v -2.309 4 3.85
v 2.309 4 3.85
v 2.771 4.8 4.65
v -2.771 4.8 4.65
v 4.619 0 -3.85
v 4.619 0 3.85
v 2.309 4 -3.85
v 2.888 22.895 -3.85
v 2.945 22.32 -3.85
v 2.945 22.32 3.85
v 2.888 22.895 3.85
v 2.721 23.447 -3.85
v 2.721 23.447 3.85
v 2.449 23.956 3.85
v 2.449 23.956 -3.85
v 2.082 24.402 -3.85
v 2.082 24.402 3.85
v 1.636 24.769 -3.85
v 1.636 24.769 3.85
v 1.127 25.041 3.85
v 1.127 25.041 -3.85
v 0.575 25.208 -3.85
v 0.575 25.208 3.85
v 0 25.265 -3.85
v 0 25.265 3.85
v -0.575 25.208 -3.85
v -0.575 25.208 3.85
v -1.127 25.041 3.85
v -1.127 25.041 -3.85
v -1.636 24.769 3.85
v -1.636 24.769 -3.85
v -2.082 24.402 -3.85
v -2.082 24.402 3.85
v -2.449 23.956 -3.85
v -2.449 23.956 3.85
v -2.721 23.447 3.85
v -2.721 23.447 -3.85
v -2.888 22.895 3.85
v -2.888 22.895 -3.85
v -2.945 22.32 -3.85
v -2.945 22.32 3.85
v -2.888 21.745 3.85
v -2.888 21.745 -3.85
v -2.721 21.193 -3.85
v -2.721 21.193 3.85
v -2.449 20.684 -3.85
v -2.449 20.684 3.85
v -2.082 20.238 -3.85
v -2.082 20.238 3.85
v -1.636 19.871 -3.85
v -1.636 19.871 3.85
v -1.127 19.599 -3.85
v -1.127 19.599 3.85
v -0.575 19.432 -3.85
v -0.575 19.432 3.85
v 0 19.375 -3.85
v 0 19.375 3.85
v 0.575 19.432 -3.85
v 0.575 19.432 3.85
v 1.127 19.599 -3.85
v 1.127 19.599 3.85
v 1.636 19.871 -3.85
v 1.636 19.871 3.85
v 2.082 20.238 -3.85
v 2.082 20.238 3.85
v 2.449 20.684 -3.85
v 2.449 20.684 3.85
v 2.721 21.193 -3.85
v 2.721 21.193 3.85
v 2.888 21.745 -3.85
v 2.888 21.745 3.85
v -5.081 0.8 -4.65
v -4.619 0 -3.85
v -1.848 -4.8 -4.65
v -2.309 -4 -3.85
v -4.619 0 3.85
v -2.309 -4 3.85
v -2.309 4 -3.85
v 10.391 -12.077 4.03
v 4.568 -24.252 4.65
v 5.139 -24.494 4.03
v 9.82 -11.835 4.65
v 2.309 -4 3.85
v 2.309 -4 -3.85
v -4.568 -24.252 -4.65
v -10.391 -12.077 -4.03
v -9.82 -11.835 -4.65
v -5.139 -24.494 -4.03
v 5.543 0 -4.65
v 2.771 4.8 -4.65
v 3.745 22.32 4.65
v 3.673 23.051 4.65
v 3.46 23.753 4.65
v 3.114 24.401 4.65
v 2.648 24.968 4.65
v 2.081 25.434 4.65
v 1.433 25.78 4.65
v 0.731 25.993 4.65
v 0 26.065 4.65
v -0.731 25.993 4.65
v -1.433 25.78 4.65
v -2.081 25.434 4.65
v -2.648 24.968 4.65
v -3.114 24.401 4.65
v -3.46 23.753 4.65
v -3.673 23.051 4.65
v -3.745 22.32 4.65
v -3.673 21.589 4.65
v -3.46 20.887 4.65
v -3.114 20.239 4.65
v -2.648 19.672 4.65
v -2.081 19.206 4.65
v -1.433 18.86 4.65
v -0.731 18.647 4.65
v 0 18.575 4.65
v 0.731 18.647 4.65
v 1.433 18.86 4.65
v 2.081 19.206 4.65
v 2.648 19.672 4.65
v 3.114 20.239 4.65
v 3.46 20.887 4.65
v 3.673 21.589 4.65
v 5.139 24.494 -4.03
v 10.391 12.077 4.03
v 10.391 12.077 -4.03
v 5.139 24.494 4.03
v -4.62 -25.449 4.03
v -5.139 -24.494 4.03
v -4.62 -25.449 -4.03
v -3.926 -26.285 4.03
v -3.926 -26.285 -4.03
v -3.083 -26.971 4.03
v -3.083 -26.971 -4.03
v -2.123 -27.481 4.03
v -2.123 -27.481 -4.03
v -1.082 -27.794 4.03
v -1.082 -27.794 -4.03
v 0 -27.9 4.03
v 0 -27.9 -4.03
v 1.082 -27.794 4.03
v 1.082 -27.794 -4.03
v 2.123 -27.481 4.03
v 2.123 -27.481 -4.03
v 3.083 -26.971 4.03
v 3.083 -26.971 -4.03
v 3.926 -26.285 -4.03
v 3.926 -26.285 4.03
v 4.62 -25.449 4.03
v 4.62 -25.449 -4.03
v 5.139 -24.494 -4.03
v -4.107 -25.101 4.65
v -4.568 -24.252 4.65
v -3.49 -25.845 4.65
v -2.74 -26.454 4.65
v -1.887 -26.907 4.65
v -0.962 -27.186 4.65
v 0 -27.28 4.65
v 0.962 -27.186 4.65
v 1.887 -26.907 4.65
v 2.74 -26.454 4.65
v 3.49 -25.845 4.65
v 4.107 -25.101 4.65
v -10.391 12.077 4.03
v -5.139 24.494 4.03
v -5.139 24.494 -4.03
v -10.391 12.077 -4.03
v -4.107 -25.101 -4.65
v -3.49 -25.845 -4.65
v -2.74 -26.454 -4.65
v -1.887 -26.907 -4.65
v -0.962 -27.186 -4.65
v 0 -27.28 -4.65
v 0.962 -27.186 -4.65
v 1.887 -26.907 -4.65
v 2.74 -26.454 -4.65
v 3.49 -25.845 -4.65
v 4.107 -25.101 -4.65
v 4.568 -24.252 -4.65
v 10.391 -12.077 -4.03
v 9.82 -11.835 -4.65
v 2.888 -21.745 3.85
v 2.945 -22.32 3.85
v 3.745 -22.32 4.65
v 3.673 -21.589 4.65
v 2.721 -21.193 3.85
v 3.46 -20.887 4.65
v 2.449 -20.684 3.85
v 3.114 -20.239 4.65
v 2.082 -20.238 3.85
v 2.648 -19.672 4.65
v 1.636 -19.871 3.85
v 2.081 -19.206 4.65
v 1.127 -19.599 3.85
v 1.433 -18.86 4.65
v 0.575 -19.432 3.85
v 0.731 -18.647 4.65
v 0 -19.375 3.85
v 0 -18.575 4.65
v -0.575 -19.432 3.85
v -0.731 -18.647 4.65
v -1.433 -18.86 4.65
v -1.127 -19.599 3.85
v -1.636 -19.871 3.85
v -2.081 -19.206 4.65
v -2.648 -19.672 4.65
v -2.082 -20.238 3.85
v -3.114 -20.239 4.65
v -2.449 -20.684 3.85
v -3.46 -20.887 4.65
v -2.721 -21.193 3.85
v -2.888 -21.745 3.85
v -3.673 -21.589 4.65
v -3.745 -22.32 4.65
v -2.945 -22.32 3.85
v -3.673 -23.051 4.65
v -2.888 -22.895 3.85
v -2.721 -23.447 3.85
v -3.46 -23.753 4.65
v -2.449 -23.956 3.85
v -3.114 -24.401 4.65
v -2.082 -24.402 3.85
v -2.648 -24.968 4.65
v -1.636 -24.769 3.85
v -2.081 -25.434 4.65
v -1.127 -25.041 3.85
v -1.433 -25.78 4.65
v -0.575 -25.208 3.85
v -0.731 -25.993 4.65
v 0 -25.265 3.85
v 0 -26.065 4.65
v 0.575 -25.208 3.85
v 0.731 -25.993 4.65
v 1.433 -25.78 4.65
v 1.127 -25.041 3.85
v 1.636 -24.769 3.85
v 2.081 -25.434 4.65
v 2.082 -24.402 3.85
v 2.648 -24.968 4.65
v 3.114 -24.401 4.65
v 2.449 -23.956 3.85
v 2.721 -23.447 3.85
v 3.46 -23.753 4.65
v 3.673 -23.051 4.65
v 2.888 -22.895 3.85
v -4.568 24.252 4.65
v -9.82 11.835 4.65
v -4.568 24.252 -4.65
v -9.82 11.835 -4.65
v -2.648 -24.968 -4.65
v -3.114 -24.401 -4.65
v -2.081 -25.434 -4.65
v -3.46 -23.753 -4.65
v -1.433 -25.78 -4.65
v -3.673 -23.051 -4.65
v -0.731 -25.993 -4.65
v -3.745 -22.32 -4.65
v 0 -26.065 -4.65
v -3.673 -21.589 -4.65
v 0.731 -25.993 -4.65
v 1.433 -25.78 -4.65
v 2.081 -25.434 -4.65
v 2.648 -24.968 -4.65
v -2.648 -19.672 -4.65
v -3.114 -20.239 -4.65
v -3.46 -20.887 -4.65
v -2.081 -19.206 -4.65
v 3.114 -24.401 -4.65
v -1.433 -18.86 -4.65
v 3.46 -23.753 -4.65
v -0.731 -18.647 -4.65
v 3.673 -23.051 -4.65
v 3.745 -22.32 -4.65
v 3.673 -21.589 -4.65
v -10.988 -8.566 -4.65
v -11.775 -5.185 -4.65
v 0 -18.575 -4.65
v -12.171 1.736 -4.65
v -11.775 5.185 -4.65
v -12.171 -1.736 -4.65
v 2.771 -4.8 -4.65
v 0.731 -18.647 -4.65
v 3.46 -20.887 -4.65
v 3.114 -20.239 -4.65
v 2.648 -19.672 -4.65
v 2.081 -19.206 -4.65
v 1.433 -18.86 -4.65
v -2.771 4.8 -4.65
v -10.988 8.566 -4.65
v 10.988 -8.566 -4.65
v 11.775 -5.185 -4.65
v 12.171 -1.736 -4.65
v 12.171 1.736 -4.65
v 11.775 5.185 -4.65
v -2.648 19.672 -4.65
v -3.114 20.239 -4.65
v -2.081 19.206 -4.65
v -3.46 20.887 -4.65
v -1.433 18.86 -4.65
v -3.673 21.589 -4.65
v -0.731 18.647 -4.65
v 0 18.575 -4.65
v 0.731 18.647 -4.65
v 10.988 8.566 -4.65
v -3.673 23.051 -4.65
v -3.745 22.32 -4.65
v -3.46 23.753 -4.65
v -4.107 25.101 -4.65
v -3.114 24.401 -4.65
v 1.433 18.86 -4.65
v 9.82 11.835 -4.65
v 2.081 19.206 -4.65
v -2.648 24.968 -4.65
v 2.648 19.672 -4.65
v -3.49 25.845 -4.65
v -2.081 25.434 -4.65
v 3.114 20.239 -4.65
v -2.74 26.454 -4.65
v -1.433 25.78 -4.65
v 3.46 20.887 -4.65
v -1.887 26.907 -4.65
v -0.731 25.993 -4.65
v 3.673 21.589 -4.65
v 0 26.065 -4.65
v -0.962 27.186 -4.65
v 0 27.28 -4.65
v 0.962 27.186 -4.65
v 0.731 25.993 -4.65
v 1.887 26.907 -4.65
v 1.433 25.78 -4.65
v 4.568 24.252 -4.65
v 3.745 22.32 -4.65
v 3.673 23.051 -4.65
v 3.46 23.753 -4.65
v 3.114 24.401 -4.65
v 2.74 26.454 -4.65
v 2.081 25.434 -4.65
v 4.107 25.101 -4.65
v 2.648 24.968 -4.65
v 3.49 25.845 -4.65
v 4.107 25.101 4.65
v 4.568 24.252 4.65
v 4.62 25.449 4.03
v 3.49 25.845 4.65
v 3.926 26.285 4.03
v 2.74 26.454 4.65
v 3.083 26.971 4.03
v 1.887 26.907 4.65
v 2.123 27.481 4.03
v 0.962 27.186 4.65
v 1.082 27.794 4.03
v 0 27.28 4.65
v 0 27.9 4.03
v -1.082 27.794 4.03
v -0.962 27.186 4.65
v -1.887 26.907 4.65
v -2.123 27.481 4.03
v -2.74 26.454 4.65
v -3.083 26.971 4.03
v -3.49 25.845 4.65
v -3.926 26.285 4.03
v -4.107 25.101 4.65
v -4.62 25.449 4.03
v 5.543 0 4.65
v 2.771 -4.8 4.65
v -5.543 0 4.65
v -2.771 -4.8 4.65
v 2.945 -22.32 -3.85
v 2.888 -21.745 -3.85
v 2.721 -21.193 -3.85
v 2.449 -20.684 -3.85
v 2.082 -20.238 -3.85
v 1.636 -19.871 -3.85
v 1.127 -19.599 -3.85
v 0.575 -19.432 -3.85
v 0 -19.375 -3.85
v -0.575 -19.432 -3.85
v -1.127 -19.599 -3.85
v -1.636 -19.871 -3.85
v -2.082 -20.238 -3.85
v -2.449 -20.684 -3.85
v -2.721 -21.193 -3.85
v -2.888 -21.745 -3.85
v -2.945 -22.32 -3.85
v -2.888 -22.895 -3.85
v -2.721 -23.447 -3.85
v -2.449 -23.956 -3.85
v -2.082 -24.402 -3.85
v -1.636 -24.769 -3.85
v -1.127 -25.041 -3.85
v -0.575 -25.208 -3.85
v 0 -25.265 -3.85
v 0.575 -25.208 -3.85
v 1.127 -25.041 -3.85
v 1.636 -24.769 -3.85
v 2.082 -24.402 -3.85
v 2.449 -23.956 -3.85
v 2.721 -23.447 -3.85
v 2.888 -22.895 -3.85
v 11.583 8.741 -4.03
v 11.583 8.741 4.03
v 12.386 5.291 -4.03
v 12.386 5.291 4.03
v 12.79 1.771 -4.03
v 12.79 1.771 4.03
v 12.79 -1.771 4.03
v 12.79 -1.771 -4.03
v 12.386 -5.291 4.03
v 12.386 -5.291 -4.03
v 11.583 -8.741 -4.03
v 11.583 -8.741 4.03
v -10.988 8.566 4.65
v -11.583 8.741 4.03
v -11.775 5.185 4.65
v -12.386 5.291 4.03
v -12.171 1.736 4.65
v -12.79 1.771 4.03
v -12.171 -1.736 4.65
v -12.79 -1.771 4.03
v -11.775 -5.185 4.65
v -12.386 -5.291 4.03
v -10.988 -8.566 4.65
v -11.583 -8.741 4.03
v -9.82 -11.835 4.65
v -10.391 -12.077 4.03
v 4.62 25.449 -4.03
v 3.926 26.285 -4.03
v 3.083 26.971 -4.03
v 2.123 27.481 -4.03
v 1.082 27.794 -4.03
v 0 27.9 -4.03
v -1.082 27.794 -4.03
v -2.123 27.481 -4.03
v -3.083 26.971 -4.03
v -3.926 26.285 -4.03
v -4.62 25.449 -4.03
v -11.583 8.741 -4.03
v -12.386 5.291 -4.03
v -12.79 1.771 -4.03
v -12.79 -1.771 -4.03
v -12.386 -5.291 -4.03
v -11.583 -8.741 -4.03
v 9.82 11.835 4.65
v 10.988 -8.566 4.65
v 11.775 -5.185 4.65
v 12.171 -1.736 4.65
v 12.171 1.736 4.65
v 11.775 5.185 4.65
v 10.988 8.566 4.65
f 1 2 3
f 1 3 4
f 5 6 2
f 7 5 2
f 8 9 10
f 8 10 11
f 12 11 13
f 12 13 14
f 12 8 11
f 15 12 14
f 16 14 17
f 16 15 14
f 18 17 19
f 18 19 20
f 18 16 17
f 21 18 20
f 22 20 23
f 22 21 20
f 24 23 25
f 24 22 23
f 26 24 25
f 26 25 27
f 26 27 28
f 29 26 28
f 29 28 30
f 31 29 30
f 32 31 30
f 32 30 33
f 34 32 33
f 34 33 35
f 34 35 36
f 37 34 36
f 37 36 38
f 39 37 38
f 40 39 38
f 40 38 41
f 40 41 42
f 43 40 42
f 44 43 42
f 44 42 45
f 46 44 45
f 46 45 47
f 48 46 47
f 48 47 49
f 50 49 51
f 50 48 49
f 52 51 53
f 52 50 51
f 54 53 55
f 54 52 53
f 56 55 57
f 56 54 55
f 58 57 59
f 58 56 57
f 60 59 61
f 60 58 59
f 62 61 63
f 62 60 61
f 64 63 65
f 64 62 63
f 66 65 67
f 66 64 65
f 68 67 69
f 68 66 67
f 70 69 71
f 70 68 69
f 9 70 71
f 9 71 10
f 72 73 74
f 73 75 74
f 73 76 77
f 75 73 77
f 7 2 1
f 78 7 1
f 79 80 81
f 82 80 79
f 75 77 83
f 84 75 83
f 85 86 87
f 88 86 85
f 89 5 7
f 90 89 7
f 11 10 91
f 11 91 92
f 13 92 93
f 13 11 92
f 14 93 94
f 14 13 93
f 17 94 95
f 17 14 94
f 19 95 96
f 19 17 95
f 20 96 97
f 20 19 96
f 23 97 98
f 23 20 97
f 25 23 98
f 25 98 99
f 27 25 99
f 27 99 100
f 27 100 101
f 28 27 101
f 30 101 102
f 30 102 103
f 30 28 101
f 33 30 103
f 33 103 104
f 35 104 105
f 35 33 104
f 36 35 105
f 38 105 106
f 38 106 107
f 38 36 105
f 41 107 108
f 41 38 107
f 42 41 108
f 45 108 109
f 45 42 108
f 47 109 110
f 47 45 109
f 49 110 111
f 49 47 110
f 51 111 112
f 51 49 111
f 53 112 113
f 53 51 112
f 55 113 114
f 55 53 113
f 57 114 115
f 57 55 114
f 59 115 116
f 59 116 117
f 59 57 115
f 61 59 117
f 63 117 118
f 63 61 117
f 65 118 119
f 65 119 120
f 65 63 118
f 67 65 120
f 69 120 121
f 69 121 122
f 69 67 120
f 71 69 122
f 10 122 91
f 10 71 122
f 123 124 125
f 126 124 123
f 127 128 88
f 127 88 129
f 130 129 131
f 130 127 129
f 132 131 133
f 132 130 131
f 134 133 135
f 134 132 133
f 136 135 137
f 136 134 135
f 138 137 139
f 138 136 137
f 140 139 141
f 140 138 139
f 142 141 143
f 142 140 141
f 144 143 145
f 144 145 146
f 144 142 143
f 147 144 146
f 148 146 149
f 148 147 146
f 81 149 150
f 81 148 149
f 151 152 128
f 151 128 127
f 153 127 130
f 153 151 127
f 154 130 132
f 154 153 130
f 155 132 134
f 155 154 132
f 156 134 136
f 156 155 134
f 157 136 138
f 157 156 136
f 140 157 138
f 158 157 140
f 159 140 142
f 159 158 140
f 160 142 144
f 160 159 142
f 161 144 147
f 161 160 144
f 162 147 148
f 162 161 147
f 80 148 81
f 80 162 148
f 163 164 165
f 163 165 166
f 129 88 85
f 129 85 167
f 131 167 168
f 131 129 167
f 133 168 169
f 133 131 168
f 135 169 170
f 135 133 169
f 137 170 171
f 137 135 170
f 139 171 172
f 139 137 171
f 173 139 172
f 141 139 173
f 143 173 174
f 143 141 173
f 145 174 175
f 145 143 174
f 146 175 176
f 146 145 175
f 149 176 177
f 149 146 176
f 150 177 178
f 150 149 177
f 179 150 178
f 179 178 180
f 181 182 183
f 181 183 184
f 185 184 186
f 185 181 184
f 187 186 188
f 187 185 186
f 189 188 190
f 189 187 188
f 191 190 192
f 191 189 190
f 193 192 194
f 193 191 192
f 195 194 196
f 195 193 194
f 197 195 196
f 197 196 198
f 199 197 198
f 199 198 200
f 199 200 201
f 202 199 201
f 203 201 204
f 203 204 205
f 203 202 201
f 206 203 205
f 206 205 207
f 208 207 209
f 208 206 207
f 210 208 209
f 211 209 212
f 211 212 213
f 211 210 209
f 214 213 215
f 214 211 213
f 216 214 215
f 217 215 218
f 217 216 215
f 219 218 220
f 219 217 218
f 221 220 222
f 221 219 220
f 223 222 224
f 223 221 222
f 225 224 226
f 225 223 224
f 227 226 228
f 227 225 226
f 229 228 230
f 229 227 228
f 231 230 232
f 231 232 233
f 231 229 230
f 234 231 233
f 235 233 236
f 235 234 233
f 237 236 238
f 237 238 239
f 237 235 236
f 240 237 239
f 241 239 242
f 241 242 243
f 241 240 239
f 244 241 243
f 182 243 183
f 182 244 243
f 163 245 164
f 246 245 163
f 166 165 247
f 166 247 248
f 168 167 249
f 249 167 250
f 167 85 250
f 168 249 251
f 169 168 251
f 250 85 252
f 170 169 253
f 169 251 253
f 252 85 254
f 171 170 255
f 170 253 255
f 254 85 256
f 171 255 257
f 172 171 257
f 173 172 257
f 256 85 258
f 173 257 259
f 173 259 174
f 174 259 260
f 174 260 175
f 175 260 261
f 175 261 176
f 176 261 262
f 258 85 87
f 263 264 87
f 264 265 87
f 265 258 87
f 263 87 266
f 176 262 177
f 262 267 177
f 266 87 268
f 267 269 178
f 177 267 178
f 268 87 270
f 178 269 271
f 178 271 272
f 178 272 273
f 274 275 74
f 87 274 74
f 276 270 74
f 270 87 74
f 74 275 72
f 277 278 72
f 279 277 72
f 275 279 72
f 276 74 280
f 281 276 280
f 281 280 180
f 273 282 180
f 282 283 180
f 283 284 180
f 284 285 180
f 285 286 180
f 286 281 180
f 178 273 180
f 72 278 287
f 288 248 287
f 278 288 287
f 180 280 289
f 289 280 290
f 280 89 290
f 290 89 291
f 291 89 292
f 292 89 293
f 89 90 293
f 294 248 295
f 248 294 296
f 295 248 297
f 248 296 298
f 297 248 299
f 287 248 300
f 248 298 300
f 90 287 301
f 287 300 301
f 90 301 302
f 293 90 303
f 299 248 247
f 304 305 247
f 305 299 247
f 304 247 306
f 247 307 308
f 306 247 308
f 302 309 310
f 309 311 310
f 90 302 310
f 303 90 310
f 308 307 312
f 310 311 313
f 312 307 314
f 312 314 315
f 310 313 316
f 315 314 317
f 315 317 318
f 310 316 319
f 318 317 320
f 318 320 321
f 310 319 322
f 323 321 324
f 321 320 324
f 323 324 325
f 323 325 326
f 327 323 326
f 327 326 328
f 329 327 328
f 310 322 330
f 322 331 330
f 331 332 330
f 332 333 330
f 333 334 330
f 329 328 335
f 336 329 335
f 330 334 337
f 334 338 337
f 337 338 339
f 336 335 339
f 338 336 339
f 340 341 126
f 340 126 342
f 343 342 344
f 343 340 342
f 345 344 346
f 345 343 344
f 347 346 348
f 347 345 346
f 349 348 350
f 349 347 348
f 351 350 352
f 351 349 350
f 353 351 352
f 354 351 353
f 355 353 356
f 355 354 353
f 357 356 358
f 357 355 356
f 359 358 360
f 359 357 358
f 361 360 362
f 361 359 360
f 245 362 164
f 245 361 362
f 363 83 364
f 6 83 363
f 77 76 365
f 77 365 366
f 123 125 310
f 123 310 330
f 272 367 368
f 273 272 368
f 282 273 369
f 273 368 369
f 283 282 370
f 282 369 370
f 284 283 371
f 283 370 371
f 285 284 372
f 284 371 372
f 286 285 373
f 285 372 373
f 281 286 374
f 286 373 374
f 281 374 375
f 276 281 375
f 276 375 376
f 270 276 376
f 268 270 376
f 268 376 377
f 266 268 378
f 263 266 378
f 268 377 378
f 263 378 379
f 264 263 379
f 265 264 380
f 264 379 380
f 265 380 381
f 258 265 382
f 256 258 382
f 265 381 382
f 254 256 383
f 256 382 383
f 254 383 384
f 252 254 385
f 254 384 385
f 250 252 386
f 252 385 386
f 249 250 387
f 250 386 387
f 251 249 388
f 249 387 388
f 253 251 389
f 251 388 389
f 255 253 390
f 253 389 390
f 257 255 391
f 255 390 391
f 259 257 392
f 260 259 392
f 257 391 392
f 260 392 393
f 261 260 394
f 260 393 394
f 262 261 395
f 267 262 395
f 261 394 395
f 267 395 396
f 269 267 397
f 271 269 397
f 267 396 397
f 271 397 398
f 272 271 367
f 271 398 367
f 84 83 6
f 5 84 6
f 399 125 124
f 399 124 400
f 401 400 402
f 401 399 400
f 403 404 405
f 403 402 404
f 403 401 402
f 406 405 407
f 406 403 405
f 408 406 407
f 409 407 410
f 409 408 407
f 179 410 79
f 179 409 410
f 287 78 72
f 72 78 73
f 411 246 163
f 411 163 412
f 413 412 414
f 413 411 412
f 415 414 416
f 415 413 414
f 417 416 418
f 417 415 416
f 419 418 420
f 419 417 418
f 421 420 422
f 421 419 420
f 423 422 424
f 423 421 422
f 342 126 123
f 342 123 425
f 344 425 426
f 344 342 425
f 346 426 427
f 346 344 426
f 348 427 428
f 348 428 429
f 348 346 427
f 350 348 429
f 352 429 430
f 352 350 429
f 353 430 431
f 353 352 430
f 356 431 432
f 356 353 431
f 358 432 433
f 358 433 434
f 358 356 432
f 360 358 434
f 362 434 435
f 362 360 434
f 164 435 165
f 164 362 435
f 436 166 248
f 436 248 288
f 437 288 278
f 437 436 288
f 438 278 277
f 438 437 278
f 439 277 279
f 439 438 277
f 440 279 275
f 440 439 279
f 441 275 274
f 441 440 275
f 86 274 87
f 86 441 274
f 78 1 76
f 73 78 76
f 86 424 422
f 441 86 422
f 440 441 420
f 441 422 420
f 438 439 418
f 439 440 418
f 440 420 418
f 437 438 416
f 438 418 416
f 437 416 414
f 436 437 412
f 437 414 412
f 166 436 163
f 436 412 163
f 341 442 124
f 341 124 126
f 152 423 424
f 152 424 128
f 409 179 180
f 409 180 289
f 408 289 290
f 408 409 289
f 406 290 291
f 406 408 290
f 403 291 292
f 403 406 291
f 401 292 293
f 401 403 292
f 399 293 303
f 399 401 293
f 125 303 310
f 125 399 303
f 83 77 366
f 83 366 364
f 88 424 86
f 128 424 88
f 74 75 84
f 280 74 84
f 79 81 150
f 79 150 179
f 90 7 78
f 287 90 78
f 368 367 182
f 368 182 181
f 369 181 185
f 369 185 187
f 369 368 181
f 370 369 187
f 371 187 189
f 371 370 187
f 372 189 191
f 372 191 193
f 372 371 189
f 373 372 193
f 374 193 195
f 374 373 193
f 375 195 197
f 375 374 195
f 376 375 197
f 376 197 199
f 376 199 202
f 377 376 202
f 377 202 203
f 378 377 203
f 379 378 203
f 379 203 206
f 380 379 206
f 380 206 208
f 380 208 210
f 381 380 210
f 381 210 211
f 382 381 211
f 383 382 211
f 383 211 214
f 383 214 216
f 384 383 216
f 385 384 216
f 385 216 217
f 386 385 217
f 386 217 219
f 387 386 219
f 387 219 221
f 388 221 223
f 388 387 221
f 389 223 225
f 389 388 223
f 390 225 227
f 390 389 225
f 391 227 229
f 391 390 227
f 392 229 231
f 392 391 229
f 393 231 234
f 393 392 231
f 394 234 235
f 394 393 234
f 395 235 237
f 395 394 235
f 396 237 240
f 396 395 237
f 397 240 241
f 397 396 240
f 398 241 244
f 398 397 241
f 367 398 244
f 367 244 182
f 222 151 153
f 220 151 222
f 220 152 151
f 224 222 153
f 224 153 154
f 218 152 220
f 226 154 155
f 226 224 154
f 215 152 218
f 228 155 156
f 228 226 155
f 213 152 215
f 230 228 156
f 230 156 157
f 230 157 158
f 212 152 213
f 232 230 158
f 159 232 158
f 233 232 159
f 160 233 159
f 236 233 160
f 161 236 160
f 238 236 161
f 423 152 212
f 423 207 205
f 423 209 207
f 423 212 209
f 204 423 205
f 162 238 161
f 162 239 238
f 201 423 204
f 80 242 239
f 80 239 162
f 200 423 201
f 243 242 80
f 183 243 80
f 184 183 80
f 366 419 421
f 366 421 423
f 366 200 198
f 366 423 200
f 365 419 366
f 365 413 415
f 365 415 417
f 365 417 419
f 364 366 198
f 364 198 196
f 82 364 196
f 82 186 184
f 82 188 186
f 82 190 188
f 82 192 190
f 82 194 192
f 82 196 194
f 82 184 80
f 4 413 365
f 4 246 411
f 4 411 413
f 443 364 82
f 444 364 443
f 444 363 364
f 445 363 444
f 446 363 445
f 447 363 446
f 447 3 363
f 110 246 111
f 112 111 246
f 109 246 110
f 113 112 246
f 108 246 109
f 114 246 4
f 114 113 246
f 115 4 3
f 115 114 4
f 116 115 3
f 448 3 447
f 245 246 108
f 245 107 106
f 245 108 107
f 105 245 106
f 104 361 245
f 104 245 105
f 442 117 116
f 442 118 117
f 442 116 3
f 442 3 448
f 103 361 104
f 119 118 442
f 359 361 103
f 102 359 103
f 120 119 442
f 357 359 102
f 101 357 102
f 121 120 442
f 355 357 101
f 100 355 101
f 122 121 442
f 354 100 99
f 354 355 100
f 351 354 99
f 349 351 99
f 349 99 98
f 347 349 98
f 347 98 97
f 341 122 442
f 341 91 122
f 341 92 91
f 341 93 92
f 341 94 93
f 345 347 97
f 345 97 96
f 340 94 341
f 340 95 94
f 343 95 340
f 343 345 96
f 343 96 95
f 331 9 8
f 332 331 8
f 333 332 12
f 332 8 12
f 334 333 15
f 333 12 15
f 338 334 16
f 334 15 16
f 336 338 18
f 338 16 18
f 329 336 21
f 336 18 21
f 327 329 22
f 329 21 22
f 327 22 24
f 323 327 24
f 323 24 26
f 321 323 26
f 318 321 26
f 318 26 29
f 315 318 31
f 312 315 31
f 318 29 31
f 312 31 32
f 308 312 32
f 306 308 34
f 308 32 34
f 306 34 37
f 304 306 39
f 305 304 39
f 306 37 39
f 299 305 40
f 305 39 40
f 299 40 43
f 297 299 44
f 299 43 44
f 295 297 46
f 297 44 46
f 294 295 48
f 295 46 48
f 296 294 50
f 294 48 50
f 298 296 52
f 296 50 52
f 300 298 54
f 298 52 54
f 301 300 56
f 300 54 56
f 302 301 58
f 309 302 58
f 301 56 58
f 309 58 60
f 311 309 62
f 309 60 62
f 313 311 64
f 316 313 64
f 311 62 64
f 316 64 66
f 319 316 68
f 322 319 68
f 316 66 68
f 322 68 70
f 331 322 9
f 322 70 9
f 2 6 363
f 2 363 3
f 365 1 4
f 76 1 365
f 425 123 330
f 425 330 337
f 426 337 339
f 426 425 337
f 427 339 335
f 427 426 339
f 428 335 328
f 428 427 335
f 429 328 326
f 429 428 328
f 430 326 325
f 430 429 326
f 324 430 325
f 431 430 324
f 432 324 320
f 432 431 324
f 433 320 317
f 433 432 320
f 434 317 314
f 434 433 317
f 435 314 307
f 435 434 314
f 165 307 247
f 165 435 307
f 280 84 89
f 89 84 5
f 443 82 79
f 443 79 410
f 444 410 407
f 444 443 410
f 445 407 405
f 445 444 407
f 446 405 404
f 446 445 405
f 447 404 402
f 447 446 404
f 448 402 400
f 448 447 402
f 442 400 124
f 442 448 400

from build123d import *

# Parameters (mm, degrees)
F0_R     = 4.75
F1_DEPTH = 7.5
F2_R     = 50
F3_SIZE  = 1
F4_SCALE = 0.62
F6_DEPTH = 25
F7_SIZE  = 0.8


with BuildPart() as f1:
    # F0 (on Top) → F1 (new body, symmetric)
    with BuildSketch(Plane.XY):
        with BuildLine():
            Line((25, 0), (8.2889389183, 39.5062075821))
            ThreePointArc((8.2889389183, 39.5062075821), (0, 45), (-8.2889389183, 39.5062075821))
            Line((-8.2889389183, 39.5062075821), (-25, 0))
            Line((-25, 0), (-8.2889389183, -39.5062075821))
            ThreePointArc((-8.2889389183, -39.5062075821), (0, -45), (8.2889389183, -39.5062075821))
            Line((8.2889389183, -39.5062075821), (25, 0))
        make_face()
        with Locations((0, -36)):
            Circle(F0_R, mode=Mode.SUBTRACT)
        with Locations((0, 36)):
            Circle(F0_R, mode=Mode.SUBTRACT)
    extrude(amount=F1_DEPTH, both=True)

    # F2
    f2_edges = [f1.edges().sort_by_distance(p)[0] for p in [
        (-25, 0, 0),
        (25, 0, 0),
    ]]
    fillet(f2_edges, radius=F2_R)

    # F3
    f3_edges = [f1.edges().sort_by_distance(p)[0] for p in [
        (0, 45, 7.5),
        (0, 45, -7.5),
        (-12.524692, -29.492569, 7.5),
        (-12.524692, -29.492569, -7.5),
    ]]
    chamfer(f3_edges, length=F3_SIZE)


with BuildPart() as f1_1:
    # F4: moved
    add(f1.part.scale(F4_SCALE))

    # F5 (on face) → F6 (cut)
    with BuildSketch(Plane.XY.offset(4.65)):
        Polygon((-2.3094010768, 4), (-4.6188021535, 0), (-2.3094010768, -4), (2.3094010768, -4), (4.6188021535, 0), (2.3094010768, 4), align=None)
    extrude(amount=-F6_DEPTH, mode=Mode.SUBTRACT)

    # F7
    f7_edges = [f1_1.edges().sort_by_distance(p)[0] for p in [
        (0, -4, 4.65),
        (-3.464102, -2, 4.65),
        (-3.464102, 2, 4.65),
        (0, 4, 4.65),
        (3.464102, 2, 4.65),
        (3.464102, -2, 4.65),
        (0, -4, -4.65),
        (3.464102, -2, -4.65),
        (3.464102, 2, -4.65),
        (0, 4, -4.65),
        (-3.464102, 2, -4.65),
        (-2.945, -22.32, 4.65),
        (-2.945, 22.32, 4.65),
        (-2.945, -22.32, -4.65),
        (-2.945, 22.32, -4.65),
    ]]
    chamfer(f7_edges, length=F7_SIZE)


solid = f1_1.part
